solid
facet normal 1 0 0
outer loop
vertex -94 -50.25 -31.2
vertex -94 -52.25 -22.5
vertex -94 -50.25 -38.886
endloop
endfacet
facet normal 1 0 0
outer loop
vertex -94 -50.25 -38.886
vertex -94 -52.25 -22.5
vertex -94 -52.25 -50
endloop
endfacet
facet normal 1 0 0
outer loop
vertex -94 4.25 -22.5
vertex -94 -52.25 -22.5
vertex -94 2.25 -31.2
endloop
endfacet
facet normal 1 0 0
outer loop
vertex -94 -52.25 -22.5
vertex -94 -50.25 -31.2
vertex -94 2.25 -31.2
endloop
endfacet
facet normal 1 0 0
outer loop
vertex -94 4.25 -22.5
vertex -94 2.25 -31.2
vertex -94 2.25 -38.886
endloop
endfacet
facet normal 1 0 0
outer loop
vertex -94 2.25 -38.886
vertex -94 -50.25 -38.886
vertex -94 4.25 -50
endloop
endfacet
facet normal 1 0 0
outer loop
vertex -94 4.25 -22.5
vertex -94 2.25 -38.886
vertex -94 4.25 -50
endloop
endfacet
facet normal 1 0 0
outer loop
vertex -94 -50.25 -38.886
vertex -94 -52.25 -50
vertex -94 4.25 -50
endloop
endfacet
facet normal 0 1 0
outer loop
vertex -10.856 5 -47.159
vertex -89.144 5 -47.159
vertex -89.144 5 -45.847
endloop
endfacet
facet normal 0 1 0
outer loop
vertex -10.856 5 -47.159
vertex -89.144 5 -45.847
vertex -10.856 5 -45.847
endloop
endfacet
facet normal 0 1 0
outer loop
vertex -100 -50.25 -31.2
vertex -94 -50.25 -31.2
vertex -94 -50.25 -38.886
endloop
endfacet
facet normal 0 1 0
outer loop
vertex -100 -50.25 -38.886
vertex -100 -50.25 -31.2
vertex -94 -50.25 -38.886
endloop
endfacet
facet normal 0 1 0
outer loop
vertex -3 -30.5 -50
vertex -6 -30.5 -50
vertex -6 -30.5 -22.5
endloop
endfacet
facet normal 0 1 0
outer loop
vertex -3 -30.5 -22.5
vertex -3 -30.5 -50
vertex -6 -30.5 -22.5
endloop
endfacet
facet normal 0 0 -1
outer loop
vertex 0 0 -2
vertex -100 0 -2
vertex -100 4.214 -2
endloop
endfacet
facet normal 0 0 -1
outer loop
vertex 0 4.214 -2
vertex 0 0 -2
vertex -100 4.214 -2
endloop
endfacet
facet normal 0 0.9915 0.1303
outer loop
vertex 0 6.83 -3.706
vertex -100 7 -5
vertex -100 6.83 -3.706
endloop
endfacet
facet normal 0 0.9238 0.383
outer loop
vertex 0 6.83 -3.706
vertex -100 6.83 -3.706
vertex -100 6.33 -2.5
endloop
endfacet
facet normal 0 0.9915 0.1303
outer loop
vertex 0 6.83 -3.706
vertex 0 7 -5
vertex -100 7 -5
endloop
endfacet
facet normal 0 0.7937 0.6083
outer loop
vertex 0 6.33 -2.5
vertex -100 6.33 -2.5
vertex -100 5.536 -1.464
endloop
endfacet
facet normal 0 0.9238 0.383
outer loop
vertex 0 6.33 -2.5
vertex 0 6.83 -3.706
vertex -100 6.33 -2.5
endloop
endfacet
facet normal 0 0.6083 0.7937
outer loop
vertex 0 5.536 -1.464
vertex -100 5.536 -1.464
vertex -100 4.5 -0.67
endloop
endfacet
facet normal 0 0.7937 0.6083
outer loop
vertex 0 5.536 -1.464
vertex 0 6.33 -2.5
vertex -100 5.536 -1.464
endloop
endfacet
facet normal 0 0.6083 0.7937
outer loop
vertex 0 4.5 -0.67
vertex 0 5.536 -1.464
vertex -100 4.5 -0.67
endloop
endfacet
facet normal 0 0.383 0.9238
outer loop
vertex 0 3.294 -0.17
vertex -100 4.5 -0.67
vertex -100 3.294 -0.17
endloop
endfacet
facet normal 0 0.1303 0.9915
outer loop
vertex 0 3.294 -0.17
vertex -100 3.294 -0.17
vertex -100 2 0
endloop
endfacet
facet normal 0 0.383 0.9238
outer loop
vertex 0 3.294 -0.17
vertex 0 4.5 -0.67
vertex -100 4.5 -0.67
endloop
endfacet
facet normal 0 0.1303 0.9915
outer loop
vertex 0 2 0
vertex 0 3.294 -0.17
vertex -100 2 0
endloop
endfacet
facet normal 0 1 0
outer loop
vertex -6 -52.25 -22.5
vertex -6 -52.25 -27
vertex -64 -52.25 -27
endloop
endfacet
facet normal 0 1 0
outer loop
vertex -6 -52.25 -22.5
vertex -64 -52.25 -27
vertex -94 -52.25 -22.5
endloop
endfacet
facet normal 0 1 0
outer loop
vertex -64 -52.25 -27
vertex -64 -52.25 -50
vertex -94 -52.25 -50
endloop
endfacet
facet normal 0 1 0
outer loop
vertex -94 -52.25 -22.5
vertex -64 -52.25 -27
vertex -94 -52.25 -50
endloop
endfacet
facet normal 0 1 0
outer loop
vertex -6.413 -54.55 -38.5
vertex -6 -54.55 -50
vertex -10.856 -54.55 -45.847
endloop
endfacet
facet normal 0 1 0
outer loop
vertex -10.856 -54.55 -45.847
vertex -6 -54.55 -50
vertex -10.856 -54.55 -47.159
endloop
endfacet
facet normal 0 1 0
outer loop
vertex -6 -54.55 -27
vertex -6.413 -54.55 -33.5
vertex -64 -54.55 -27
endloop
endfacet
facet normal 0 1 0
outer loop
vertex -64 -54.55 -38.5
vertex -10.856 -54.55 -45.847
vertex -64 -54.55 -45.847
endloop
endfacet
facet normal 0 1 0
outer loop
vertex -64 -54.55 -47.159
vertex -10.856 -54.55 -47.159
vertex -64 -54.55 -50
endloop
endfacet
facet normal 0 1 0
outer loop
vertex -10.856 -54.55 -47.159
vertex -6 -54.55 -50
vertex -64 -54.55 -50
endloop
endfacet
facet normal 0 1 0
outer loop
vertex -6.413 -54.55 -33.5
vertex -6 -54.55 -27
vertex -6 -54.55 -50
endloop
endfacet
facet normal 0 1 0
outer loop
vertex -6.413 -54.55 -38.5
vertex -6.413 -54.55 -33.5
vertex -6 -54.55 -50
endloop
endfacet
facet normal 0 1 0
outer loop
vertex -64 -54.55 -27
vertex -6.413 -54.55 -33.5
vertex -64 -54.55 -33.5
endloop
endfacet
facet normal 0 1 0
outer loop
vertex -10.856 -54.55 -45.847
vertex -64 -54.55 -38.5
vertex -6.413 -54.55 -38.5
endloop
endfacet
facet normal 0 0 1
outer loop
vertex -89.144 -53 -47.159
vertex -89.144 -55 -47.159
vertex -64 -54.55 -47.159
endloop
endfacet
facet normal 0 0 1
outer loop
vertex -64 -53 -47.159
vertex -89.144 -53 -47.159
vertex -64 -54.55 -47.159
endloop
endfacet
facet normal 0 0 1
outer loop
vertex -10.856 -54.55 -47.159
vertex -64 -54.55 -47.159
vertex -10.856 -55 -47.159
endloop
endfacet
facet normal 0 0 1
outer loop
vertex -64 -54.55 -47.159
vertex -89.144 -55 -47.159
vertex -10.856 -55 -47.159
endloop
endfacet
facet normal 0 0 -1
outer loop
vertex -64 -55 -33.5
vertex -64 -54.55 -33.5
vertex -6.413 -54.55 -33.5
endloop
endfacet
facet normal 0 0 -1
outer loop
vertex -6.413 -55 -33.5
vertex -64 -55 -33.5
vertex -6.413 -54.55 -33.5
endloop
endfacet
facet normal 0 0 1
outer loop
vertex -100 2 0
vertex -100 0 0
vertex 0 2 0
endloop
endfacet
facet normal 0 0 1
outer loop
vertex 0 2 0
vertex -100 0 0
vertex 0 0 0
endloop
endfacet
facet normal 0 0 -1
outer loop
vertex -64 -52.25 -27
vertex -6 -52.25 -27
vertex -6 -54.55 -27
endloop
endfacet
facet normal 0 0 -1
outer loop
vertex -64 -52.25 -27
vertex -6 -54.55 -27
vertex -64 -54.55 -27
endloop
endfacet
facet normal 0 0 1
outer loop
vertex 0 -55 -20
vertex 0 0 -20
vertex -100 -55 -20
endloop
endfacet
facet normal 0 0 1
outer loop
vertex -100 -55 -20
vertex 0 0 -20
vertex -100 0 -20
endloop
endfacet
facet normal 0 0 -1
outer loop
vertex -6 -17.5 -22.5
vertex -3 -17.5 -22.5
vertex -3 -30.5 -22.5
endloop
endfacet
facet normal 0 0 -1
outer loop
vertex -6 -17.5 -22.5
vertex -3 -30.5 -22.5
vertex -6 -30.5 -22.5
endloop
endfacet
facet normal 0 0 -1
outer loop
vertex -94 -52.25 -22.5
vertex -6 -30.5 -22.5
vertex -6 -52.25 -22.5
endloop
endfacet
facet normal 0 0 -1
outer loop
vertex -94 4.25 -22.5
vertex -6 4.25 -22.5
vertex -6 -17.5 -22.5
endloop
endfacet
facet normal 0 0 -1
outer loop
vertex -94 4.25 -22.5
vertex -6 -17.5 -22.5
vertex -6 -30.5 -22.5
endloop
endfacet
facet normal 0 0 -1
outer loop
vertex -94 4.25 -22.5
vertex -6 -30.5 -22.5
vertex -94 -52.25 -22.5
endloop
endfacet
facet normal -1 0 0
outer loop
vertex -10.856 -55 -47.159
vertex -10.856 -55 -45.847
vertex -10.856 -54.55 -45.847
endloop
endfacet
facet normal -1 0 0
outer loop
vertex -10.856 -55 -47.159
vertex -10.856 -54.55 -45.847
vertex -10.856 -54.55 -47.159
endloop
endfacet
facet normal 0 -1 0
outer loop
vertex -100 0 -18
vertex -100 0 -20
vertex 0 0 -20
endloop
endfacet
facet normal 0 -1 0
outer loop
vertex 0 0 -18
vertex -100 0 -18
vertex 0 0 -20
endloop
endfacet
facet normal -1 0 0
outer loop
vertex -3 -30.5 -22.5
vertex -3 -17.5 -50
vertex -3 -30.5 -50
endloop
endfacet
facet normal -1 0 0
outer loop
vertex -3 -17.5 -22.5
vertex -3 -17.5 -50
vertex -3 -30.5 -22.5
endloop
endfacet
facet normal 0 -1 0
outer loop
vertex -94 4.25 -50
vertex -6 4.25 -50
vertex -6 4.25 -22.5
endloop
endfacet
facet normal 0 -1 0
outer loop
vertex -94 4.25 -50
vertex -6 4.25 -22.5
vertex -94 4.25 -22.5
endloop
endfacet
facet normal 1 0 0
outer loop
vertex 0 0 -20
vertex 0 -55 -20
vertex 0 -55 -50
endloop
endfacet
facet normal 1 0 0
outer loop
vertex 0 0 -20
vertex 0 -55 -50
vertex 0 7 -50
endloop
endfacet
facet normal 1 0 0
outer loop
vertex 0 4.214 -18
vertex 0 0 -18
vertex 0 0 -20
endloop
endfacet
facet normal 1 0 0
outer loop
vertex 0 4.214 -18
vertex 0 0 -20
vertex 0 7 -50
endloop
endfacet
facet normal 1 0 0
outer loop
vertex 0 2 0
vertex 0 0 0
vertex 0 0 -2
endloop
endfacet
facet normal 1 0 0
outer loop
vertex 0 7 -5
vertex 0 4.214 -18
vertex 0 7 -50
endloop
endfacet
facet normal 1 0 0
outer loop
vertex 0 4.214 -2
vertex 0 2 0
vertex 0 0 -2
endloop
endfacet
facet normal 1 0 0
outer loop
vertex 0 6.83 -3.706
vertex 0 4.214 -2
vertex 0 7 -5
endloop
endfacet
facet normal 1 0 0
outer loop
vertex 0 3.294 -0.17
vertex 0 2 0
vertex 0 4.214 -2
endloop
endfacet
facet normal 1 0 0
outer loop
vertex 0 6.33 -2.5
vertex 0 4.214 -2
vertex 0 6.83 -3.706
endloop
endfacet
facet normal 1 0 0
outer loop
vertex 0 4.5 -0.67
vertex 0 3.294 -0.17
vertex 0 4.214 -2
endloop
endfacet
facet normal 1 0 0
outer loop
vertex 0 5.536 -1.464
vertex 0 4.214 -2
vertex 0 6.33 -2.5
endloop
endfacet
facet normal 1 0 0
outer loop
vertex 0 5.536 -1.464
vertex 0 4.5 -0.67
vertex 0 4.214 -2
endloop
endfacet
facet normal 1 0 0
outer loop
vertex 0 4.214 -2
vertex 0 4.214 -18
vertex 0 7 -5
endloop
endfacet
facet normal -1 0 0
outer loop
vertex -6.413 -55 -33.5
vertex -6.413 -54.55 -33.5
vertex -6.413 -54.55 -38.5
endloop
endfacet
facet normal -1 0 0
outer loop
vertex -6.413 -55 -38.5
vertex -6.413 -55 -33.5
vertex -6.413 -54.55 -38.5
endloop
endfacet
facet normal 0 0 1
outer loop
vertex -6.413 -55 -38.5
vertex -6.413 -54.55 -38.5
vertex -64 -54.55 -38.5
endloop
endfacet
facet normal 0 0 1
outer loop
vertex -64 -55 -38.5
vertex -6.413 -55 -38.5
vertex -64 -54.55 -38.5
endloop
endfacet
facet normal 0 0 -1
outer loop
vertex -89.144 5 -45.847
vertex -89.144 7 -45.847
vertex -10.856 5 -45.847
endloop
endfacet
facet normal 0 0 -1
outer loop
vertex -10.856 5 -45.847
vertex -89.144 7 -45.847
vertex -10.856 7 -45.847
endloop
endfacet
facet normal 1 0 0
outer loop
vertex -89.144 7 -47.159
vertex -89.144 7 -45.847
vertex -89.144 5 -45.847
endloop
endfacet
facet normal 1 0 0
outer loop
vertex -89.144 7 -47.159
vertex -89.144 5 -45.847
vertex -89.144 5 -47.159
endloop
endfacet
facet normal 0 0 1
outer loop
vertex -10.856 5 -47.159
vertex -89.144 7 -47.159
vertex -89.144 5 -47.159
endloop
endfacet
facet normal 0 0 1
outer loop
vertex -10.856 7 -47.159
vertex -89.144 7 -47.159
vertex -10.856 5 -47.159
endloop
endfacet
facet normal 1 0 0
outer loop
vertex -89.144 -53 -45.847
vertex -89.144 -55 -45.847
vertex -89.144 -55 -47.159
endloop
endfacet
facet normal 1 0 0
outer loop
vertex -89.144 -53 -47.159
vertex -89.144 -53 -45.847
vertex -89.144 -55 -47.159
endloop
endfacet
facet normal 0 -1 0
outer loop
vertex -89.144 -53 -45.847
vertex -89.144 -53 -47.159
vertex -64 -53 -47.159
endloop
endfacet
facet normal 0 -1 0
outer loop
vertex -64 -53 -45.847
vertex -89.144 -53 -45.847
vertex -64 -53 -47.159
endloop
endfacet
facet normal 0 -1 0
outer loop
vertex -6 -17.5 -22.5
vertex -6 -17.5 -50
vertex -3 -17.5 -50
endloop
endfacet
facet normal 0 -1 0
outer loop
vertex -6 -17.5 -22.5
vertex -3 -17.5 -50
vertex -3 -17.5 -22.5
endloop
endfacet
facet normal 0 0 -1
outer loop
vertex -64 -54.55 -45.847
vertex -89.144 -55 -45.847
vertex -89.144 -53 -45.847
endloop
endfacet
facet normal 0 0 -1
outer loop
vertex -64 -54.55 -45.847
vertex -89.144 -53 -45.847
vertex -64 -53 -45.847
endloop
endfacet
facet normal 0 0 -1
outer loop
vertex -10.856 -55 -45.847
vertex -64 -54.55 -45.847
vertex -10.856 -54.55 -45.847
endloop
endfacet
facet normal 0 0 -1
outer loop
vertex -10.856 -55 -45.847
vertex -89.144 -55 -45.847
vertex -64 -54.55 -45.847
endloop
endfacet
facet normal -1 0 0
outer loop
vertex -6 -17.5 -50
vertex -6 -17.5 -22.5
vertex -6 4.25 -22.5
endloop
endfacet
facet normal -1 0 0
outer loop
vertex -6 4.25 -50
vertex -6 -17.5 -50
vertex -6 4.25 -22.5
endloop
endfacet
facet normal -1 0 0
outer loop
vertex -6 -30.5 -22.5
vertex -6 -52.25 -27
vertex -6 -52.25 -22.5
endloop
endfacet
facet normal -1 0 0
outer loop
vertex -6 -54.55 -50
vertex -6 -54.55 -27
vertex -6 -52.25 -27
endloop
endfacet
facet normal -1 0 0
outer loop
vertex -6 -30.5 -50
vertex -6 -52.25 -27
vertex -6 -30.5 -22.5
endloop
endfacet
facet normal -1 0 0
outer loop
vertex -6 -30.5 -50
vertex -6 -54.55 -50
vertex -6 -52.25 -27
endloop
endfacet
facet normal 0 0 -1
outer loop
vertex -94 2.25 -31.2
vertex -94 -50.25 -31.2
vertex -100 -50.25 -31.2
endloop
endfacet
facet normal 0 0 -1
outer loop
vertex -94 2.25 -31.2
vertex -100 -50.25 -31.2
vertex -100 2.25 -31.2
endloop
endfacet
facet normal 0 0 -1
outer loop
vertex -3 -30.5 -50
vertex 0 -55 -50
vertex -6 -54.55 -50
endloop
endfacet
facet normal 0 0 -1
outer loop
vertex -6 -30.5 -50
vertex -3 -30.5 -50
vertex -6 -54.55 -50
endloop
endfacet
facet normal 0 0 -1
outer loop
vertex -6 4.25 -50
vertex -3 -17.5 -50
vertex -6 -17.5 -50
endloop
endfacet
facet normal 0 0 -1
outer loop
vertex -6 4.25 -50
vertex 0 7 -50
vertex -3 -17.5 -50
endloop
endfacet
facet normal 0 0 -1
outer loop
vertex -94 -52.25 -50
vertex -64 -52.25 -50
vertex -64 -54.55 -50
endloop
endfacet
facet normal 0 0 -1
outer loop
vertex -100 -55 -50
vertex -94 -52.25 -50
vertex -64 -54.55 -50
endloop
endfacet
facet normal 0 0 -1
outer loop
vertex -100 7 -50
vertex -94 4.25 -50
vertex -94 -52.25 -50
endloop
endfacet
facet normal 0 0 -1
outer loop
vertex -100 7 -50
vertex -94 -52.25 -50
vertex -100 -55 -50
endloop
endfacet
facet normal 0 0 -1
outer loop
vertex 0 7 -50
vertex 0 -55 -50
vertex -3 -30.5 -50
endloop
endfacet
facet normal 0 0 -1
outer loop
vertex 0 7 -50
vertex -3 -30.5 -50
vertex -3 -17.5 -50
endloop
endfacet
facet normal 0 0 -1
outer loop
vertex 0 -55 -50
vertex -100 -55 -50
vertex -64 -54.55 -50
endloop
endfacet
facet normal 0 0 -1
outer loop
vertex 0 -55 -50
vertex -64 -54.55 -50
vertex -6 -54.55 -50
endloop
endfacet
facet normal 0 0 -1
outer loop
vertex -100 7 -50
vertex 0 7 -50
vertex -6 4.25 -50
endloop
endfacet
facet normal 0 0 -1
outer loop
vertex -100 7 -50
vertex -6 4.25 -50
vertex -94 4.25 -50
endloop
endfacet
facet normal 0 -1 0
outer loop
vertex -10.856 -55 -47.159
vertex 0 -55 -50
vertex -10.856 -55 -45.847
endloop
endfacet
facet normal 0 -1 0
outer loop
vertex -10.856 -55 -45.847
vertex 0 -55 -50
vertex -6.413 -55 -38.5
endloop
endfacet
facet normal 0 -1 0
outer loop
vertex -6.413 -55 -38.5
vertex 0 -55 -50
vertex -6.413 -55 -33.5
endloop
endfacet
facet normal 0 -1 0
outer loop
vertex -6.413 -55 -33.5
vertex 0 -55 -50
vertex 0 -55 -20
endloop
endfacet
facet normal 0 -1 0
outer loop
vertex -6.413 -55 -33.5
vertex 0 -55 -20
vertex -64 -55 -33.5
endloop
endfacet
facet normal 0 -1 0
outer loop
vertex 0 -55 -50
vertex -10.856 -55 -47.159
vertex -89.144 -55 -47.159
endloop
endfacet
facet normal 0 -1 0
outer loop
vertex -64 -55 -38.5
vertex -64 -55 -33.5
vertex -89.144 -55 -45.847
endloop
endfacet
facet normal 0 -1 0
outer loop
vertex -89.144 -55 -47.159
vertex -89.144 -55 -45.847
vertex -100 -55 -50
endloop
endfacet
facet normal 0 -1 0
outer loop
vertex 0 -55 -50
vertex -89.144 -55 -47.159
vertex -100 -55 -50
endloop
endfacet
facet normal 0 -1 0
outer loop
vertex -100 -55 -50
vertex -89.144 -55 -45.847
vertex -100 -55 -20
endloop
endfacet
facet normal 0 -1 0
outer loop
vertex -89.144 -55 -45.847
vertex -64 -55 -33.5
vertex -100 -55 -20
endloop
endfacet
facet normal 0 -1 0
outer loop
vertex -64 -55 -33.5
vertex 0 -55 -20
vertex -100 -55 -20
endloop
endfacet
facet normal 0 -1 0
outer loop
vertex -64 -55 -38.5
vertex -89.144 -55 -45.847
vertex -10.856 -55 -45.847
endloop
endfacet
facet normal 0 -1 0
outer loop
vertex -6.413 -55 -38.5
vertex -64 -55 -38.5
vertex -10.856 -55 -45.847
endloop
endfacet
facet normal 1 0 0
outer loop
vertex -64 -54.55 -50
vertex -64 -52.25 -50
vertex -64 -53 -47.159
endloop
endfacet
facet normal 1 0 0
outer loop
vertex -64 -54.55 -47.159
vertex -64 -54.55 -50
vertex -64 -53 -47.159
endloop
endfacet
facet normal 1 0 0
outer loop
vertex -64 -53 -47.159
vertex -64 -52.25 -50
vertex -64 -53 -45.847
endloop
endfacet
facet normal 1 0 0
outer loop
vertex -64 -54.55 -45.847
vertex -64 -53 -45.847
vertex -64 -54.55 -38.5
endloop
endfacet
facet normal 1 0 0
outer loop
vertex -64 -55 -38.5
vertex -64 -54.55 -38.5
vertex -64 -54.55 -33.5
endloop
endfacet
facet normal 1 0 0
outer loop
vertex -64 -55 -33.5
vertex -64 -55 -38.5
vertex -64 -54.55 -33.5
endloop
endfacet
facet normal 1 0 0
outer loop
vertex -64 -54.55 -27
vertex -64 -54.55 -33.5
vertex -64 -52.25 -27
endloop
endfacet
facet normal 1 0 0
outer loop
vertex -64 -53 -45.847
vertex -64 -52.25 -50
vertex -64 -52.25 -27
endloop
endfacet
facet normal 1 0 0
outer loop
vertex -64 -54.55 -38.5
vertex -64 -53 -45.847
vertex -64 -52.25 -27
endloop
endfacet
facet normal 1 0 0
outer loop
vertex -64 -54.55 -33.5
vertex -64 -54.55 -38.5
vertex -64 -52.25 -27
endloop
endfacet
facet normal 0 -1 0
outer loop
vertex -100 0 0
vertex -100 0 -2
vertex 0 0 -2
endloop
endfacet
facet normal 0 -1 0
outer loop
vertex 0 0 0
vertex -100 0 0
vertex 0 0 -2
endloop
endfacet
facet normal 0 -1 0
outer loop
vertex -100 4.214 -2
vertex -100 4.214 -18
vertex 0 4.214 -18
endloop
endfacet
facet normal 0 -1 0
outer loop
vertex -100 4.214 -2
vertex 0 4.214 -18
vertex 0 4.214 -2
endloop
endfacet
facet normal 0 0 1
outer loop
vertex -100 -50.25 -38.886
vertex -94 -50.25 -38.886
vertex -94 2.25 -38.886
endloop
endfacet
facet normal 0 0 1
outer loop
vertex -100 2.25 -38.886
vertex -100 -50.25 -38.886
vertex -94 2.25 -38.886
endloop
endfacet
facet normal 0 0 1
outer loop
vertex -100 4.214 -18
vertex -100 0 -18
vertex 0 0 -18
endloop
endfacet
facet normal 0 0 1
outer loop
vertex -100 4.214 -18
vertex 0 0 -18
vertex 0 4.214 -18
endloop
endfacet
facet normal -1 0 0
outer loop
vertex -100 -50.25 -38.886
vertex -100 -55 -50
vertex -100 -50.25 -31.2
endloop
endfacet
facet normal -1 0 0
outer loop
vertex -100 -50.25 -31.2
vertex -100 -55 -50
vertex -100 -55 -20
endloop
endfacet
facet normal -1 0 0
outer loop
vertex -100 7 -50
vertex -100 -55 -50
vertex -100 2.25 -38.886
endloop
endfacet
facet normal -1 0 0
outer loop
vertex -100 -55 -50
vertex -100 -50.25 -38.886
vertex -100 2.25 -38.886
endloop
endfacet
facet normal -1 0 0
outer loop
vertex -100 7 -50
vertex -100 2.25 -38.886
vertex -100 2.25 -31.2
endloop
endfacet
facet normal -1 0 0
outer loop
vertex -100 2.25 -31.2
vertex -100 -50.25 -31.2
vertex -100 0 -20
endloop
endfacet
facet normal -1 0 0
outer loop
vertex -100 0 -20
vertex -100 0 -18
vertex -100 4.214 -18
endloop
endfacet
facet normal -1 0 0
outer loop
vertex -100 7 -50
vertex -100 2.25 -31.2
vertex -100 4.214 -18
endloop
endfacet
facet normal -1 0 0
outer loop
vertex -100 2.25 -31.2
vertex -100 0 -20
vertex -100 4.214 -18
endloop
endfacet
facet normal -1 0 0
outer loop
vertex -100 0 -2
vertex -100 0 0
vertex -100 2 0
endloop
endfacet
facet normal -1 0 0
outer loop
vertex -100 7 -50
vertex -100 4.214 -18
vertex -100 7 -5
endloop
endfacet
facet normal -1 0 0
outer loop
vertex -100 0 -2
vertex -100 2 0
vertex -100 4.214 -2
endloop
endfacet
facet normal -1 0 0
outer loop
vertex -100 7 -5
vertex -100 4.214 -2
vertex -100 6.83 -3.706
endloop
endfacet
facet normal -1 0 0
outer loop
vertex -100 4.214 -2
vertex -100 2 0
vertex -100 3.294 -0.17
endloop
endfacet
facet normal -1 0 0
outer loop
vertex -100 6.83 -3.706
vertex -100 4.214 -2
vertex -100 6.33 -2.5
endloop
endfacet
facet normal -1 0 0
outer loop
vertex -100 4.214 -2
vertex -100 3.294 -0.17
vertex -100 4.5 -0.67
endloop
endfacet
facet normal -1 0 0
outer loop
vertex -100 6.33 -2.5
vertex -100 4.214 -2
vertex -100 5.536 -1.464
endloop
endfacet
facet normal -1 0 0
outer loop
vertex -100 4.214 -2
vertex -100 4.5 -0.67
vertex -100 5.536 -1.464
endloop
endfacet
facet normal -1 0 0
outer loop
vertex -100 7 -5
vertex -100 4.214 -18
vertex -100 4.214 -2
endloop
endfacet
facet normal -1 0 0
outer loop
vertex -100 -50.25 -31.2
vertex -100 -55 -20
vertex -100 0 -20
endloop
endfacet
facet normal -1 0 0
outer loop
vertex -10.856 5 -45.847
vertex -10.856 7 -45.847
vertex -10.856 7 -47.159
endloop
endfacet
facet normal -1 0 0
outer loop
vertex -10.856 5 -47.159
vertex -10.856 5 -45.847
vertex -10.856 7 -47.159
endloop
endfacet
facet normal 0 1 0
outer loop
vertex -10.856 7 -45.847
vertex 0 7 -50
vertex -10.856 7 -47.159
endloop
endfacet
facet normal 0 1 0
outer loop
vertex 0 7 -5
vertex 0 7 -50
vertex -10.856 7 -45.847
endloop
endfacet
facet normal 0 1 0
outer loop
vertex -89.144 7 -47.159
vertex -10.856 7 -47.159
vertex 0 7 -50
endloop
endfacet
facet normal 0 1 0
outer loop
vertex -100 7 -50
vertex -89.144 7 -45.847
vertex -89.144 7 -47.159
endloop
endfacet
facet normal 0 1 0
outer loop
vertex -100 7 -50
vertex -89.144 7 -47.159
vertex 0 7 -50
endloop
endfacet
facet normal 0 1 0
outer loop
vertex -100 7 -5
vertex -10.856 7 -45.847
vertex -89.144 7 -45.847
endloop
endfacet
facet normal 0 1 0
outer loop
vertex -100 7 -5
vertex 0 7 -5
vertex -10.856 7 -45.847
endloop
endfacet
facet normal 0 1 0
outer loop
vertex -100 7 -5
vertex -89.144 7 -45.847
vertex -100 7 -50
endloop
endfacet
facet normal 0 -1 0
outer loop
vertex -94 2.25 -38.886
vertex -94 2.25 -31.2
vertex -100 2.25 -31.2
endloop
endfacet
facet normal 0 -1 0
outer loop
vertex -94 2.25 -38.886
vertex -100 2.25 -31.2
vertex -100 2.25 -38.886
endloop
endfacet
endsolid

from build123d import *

# Parameters (mm, degrees)
SKETCH1_W           = 100
SKETCH1_H           = 20
BOSS_EXTRUDE1_DEPTH = 7
SKETCH2_W           = 16
SKETCH2_H           = 8.428142516
CUT_EXTRUDE1_DEPTH  = 101
SKETCH3_W           = 100
SKETCH3_H           = 62
BOSS_EXTRUDE2_DEPTH = 30
SKETCH4_W           = 88
SKETCH4_H           = 56.5
CUT_EXTRUDE2_DEPTH  = 27.5
SKETCH5_W           = 7.686328358
SKETCH5_H           = 52.5
CUT_EXTRUDE3_DEPTH  = 7
SKETCH6_W           = 27.5
SKETCH6_H           = 13
CUT_EXTRUDE4_DEPTH  = 3
SKETCH7_W           = 58
SKETCH7_H           = 2.3
CUT_EXTRUDE5_DEPTH  = 23
CUT_EXTRUDE6_DEPTH  = 23
SKETCH10_W          = 78.288889142
SKETCH10_H          = 1.311621563
CUT_EXTRUDE7_DEPTH  = 2
FILLET2_R           = 5


with BuildPart() as part:
    # Sketch1 → Boss-Extrude1 (new body)
    with BuildSketch(Plane(origin=(0, 0, 0), x_dir=(1, 0, 0), z_dir=(0, 1, 0))):
        with Locations((-50, 10)):
            Rectangle(SKETCH1_W, SKETCH1_H)
    extrude(amount=BOSS_EXTRUDE1_DEPTH)

    # Sketch2 → Cut-Extrude1 (cut, through all)
    with BuildSketch(Plane.ZY.offset(100)):
        with Locations((-10, 0)):
            Rectangle(SKETCH2_W, SKETCH2_H)
    extrude(amount=-CUT_EXTRUDE1_DEPTH, mode=Mode.SUBTRACT)

    # Sketch3 → Boss-Extrude2 (add)
    with BuildSketch(Plane(origin=(0, 0, -20), x_dir=(-1, 0, 0), z_dir=(0, 0, -1))):
        with Locations((50, -24)):
            Rectangle(SKETCH3_W, SKETCH3_H)
    extrude(amount=BOSS_EXTRUDE2_DEPTH)

    # Sketch4 → Cut-Extrude2 (cut)
    with BuildSketch(Plane(origin=(0, 0, -50), x_dir=(-1, 0, 0), z_dir=(0, 0, -1))):
        with Locations((50, -24)):
            Rectangle(SKETCH4_W, SKETCH4_H)
    extrude(amount=-CUT_EXTRUDE2_DEPTH, mode=Mode.SUBTRACT)

    # Sketch5 → Cut-Extrude3 (cut, through all)
    with BuildSketch(Plane(origin=(-94, 0, 0), x_dir=(0, 0, -1), z_dir=(1, 0, 0))):
        with Locations((35.043164179, -24)):
            Rectangle(SKETCH5_W, SKETCH5_H)
    extrude(amount=-CUT_EXTRUDE3_DEPTH, mode=Mode.SUBTRACT)

    # Sketch6 → Cut-Extrude4 (cut)
    with BuildSketch(Plane.ZY.offset(6)):
        with Locations((-36.25, -24)):
            Rectangle(SKETCH6_W, SKETCH6_H)
    extrude(amount=-CUT_EXTRUDE4_DEPTH, mode=Mode.SUBTRACT)

    # Sketch7 → Cut-Extrude5 (cut)
    with BuildSketch(Plane(origin=(0, 0, -50), x_dir=(-1, 0, 0), z_dir=(0, 0, -1))):
        with Locations((35, -53.4)):
            Rectangle(SKETCH7_W, SKETCH7_H)
    extrude(amount=-CUT_EXTRUDE5_DEPTH, mode=Mode.SUBTRACT)

    # Sketch9 → Cut-Extrude6 (cut)
    with BuildSketch(Plane(origin=(0, -52.25, 0), x_dir=(1, 0, 0), z_dir=(0, 1, 0))):
        Polygon((-37.960647242, 38.5), (-64, 38.5), (-64, 33.5), (-37.960647242, 33.5), (-6.413001969, 33.5), (-6.413001969, 38.5), align=None)
    extrude(amount=-CUT_EXTRUDE6_DEPTH, mode=Mode.SUBTRACT)

    # Sketch10 → Cut-Extrude7 (cut)
    with BuildSketch(Plane(origin=(0, 7, 0), x_dir=(1, 0, 0), z_dir=(0, 1, 0))):
        with Locations((-50, 46.502804438)):
            Rectangle(SKETCH10_W, SKETCH10_H)
    cut_extrude7 = extrude(amount=-CUT_EXTRUDE7_DEPTH, mode=Mode.SUBTRACT)

    # Mirror1: Cut-Extrude7 across plane
    add(cut_extrude7.mirror(Plane.ZX.offset(-24)), mode=Mode.SUBTRACT)

    # Fillet2
    fillet2_edges = [part.edges().sort_by_distance(p)[0] for p in [
        (-50, 7, 0),
    ]]
    fillet(fillet2_edges, radius=FILLET2_R)


solid = part.part
